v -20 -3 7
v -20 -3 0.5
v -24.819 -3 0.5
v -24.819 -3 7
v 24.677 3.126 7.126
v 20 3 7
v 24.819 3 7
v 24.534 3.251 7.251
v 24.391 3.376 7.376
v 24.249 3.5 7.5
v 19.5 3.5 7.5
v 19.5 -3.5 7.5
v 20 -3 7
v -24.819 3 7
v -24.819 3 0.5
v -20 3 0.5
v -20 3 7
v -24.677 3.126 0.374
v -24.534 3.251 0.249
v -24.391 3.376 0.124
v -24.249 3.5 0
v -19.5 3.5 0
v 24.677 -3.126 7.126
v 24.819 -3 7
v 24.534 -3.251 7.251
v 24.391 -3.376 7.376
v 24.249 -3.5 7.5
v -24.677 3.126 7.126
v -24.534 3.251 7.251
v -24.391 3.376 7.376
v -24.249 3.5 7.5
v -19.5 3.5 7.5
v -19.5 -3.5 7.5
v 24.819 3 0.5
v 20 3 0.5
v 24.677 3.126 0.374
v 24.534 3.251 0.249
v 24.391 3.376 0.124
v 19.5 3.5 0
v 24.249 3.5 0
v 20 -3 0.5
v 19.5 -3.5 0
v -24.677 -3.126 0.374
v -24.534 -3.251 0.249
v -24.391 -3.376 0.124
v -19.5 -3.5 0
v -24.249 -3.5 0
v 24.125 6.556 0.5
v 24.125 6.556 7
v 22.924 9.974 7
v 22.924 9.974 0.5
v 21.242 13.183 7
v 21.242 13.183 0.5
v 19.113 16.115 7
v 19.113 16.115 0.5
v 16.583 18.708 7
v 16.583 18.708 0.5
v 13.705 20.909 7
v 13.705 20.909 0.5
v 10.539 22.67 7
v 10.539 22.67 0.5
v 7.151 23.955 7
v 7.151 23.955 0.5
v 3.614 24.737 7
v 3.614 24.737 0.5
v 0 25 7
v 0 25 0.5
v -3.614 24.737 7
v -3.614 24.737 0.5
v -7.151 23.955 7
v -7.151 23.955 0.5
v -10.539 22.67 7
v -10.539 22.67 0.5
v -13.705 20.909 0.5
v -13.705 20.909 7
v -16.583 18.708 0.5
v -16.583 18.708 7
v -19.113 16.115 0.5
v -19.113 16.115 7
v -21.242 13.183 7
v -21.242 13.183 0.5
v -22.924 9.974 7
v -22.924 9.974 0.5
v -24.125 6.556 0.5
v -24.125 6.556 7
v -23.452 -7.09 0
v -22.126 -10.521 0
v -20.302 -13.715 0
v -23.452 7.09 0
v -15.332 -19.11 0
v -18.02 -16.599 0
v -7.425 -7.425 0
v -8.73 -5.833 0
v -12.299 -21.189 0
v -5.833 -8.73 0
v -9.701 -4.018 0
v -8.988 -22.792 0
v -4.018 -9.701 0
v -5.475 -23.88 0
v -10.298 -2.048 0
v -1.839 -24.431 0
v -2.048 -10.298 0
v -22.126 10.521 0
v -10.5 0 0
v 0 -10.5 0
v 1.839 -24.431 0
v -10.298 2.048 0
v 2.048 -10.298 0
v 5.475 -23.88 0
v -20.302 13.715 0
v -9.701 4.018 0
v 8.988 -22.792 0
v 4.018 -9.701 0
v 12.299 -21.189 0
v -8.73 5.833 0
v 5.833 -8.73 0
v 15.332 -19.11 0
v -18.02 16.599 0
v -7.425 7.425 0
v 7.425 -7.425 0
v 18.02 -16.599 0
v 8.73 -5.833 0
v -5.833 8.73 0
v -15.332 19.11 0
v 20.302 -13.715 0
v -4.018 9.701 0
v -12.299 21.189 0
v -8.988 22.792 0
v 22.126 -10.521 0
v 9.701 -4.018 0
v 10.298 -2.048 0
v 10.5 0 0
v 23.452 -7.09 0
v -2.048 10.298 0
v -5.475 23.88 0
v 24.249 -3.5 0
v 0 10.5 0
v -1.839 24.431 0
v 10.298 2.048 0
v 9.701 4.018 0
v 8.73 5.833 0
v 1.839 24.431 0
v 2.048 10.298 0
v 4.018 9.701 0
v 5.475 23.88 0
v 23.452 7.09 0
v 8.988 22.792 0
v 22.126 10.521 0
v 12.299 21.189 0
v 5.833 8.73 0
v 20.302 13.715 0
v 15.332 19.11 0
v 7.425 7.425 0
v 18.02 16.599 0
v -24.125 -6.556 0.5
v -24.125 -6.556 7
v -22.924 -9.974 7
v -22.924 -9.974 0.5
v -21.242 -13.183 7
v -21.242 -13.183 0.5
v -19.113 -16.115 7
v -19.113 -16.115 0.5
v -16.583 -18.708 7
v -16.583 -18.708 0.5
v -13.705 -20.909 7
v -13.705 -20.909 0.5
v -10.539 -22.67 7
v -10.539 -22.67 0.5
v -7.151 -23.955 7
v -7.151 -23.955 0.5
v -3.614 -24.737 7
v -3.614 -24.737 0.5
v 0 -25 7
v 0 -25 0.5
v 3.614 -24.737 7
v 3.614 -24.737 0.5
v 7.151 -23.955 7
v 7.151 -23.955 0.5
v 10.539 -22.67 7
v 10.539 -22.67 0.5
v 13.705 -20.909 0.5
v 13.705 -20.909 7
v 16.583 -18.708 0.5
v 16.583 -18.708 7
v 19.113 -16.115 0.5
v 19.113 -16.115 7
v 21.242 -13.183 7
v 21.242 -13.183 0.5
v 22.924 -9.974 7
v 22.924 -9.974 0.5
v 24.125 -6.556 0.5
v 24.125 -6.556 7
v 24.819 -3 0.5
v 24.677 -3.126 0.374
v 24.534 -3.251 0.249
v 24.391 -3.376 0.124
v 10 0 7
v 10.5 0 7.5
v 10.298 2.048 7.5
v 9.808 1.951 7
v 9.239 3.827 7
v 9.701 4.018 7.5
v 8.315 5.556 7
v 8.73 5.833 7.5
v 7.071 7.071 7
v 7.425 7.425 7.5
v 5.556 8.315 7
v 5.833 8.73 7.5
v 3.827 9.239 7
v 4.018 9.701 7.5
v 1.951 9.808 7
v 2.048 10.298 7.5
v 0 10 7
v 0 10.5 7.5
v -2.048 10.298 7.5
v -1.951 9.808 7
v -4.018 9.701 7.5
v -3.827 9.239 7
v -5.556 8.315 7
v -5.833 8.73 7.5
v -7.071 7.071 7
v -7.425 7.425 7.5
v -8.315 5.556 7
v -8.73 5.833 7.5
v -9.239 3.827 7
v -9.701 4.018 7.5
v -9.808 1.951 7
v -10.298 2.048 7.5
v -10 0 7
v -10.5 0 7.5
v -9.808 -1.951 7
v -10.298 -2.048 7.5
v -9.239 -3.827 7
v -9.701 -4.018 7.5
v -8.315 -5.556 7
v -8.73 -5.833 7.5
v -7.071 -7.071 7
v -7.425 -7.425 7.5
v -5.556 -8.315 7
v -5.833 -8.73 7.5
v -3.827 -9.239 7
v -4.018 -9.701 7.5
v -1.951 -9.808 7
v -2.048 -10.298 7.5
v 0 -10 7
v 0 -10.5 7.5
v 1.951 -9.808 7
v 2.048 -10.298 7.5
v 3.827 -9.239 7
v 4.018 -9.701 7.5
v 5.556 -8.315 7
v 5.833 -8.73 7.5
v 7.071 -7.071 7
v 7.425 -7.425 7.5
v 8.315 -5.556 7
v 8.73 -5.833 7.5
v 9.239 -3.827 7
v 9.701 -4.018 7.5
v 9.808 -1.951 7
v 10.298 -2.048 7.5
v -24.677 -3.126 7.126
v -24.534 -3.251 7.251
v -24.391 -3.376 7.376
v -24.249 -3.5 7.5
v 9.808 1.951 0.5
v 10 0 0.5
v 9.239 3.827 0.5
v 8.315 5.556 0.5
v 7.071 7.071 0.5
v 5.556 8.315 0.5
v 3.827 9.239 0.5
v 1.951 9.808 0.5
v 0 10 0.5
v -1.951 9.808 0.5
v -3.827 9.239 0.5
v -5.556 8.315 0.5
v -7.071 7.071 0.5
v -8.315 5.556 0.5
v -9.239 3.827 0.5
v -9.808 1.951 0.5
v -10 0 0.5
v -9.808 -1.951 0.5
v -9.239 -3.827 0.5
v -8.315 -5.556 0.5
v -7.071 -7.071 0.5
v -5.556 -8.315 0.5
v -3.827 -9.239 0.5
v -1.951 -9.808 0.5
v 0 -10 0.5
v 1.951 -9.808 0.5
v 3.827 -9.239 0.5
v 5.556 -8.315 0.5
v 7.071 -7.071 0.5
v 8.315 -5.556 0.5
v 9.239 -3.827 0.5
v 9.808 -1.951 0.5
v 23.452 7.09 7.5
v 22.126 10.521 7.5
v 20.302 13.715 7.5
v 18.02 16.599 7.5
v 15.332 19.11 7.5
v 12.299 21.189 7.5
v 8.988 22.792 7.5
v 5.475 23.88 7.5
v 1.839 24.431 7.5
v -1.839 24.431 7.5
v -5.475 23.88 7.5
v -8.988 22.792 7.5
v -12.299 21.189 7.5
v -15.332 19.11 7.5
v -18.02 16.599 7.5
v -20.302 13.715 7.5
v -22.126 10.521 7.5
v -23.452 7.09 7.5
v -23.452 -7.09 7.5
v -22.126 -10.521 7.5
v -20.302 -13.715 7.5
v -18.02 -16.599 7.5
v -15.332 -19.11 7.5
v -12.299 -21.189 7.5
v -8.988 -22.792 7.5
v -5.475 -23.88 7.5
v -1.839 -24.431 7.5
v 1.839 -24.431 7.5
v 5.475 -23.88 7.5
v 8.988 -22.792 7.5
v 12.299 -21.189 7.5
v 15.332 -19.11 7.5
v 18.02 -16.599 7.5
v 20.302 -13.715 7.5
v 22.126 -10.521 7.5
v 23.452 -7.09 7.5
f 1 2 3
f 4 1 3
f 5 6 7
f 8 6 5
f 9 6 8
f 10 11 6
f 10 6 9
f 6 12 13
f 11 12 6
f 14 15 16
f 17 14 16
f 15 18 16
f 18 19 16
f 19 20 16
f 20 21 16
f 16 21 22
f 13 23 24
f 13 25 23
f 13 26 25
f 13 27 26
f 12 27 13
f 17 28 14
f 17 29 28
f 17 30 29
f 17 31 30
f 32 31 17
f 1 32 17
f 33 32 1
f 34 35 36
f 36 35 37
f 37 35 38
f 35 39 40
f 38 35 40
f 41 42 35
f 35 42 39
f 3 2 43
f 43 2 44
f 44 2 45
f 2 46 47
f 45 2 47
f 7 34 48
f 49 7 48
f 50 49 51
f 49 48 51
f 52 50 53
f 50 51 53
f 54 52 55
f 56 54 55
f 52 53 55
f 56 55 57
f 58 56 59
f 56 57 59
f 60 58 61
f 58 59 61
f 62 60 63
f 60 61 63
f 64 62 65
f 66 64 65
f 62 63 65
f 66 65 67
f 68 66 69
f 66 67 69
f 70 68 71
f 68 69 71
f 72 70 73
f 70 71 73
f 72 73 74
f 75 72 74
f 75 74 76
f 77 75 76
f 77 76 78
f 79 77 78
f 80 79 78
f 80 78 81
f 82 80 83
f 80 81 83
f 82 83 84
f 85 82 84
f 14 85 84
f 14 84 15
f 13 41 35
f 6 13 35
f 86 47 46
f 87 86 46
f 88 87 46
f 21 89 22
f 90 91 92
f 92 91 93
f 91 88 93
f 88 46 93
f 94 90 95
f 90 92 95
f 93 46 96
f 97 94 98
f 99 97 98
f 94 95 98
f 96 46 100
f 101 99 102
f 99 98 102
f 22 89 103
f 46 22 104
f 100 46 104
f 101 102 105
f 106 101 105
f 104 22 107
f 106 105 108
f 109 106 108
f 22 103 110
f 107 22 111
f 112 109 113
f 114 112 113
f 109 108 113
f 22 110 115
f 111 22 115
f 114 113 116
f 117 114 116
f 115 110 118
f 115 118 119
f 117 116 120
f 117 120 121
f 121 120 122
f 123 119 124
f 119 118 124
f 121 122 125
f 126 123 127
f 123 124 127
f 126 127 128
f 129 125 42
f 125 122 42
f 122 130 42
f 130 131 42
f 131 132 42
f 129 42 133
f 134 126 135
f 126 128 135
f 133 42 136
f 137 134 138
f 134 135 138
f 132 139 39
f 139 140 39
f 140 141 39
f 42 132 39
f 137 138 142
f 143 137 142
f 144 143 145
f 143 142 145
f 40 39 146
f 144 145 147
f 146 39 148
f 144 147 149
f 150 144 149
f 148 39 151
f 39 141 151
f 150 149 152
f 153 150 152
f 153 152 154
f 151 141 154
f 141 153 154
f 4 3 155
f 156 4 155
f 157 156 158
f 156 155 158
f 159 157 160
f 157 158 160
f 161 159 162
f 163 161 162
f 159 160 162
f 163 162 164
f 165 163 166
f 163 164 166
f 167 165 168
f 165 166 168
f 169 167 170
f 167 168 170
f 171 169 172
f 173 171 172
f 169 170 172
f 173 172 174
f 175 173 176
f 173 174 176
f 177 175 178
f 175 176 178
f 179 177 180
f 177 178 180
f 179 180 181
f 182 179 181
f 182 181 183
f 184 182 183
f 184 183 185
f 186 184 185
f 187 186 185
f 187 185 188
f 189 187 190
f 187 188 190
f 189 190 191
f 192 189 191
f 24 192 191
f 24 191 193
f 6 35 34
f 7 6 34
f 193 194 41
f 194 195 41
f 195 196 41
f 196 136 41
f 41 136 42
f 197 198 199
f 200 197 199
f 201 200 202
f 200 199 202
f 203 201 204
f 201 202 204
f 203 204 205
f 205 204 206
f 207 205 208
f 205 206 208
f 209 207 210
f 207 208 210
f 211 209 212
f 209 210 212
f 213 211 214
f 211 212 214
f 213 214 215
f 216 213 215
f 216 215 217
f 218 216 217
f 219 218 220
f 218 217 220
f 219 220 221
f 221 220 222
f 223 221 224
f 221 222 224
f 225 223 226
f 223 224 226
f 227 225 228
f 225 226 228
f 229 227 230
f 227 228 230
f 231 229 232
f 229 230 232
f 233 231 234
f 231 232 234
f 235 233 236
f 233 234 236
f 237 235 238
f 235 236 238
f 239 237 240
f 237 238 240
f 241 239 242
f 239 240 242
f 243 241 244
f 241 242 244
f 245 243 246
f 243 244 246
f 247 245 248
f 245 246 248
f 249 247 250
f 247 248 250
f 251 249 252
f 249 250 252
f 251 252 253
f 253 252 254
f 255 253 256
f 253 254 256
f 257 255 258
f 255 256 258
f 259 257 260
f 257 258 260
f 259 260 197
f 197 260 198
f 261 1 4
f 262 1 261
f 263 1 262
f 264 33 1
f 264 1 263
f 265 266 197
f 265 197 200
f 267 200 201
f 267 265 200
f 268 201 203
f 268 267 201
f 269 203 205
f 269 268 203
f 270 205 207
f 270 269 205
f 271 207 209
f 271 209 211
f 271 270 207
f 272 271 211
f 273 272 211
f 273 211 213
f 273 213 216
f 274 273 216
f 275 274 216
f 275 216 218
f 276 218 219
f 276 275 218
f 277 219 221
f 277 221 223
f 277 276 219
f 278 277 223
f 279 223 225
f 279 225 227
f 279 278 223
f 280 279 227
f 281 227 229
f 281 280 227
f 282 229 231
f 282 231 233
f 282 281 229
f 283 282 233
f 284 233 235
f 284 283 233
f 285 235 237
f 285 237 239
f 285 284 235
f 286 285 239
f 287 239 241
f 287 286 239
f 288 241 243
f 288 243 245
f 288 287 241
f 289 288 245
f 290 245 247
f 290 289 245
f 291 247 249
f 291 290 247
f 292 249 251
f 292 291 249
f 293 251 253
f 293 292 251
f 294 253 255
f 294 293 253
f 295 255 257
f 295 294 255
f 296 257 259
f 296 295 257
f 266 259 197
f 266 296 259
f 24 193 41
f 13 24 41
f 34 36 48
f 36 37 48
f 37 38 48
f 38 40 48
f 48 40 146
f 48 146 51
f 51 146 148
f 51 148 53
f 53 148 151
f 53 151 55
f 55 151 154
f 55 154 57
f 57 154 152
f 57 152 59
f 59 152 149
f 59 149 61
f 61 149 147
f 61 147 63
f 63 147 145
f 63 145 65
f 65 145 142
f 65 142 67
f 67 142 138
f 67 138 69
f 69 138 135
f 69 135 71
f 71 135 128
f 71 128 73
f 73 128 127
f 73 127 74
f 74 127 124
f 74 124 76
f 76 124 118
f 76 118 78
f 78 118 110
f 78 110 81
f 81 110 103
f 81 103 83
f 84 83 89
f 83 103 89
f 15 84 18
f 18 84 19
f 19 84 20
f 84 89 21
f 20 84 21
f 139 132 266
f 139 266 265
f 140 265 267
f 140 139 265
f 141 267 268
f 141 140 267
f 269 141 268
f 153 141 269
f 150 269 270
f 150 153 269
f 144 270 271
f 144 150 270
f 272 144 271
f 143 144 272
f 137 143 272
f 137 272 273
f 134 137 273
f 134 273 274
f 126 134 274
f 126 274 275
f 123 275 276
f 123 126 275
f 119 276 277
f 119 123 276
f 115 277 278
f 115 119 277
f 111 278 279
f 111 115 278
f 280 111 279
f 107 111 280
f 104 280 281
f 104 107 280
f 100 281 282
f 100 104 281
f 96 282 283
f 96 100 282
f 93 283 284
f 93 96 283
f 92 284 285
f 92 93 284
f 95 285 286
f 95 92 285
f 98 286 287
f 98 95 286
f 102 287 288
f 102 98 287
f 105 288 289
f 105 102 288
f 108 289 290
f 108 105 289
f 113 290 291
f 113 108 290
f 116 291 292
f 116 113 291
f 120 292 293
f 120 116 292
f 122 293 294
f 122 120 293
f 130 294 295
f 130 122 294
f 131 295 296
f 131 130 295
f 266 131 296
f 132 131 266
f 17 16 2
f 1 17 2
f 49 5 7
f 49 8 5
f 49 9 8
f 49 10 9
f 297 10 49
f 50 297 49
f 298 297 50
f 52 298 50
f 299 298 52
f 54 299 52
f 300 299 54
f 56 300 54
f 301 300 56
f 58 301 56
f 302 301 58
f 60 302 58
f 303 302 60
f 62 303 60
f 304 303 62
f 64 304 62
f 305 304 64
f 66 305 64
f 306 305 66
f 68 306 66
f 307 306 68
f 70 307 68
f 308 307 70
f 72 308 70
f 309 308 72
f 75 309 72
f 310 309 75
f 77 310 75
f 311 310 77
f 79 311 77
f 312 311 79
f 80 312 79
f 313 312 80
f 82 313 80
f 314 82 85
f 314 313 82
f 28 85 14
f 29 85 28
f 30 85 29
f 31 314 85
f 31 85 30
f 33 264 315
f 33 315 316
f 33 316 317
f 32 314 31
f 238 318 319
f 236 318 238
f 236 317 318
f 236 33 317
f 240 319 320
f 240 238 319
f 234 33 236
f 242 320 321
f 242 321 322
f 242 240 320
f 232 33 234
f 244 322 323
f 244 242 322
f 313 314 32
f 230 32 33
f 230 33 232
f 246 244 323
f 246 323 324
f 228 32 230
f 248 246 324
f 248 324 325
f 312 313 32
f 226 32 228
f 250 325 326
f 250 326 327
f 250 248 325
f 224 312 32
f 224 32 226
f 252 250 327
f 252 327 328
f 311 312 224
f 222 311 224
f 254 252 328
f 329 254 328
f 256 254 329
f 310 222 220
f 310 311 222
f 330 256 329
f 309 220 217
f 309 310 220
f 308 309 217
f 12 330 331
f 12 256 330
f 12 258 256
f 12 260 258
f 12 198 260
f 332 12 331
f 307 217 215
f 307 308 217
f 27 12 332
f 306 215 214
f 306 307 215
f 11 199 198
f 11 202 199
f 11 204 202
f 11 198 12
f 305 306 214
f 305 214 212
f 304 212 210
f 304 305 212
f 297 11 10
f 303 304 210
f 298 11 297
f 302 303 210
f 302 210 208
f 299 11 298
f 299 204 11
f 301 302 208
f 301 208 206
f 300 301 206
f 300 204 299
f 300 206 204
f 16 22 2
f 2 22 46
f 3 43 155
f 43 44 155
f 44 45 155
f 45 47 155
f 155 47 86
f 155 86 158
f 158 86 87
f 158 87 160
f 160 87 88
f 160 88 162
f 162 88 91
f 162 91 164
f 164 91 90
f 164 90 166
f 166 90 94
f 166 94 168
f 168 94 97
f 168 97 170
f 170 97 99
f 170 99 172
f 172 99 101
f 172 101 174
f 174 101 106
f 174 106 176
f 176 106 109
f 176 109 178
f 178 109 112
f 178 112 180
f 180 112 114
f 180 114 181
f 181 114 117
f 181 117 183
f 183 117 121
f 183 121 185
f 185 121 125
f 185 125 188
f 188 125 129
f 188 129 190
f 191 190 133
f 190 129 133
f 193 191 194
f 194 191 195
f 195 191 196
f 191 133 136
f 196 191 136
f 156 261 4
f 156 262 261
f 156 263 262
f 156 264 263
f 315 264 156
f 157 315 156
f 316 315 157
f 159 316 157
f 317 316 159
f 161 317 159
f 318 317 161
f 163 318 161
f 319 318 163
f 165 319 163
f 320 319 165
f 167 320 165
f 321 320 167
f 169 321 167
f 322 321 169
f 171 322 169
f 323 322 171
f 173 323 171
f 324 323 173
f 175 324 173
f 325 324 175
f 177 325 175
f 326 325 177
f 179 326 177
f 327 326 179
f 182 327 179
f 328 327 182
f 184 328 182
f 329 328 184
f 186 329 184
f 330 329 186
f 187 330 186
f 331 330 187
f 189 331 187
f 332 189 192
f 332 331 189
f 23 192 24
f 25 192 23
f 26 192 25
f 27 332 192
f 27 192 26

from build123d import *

# Parameters (mm, degrees)
F0_R     = 10
F1_DEPTH = 7.5
F2_SIZE  = 0.5


with BuildPart() as f1:
    # F0 (on Top) → F1 (new body)
    with BuildSketch(Plane.XY):
        with BuildLine():
            Line((20, 3), (24.819347, 3))
            ThreePointArc((24.819347, 3), (0, 25), (-24.819347, 3))
            Line((-24.819347, 3), (-20, 3))
            Line((-20, 3), (-20, -3))
            Line((-20, -3), (-24.819347, -3))
            ThreePointArc((-24.819347, -3), (0, -25), (24.819347, -3))
            Line((24.819347, -3), (20, -3))
            Line((20, -3), (20, 3))
        make_face()
        Circle(F0_R, mode=Mode.SUBTRACT)
    extrude(amount=F1_DEPTH)

    # F2
    f2_edges = [f1.edges().sort_by_distance(p)[0] for p in [
        (22.409674, 3, 7.5),
        (0, 25, 7.5),
        (-22.409674, 3, 7.5),
        (-20, 0, 7.5),
        (-22.409674, -3, 7.5),
        (0, -25, 7.5),
        (22.409674, -3, 7.5),
        (20, 0, 7.5),
        (-10, 0, 7.5),
        (22.409674, 3, 0),
        (0, 25, 0),
        (-22.409674, 3, 0),
        (-20, 0, 0),
        (-22.409674, -3, 0),
        (0, -25, 0),
        (22.409674, -3, 0),
        (20, 0, 0),
        (-10, 0, 0),
    ]]
    chamfer(f2_edges, length=F2_SIZE)


solid = f1.part
